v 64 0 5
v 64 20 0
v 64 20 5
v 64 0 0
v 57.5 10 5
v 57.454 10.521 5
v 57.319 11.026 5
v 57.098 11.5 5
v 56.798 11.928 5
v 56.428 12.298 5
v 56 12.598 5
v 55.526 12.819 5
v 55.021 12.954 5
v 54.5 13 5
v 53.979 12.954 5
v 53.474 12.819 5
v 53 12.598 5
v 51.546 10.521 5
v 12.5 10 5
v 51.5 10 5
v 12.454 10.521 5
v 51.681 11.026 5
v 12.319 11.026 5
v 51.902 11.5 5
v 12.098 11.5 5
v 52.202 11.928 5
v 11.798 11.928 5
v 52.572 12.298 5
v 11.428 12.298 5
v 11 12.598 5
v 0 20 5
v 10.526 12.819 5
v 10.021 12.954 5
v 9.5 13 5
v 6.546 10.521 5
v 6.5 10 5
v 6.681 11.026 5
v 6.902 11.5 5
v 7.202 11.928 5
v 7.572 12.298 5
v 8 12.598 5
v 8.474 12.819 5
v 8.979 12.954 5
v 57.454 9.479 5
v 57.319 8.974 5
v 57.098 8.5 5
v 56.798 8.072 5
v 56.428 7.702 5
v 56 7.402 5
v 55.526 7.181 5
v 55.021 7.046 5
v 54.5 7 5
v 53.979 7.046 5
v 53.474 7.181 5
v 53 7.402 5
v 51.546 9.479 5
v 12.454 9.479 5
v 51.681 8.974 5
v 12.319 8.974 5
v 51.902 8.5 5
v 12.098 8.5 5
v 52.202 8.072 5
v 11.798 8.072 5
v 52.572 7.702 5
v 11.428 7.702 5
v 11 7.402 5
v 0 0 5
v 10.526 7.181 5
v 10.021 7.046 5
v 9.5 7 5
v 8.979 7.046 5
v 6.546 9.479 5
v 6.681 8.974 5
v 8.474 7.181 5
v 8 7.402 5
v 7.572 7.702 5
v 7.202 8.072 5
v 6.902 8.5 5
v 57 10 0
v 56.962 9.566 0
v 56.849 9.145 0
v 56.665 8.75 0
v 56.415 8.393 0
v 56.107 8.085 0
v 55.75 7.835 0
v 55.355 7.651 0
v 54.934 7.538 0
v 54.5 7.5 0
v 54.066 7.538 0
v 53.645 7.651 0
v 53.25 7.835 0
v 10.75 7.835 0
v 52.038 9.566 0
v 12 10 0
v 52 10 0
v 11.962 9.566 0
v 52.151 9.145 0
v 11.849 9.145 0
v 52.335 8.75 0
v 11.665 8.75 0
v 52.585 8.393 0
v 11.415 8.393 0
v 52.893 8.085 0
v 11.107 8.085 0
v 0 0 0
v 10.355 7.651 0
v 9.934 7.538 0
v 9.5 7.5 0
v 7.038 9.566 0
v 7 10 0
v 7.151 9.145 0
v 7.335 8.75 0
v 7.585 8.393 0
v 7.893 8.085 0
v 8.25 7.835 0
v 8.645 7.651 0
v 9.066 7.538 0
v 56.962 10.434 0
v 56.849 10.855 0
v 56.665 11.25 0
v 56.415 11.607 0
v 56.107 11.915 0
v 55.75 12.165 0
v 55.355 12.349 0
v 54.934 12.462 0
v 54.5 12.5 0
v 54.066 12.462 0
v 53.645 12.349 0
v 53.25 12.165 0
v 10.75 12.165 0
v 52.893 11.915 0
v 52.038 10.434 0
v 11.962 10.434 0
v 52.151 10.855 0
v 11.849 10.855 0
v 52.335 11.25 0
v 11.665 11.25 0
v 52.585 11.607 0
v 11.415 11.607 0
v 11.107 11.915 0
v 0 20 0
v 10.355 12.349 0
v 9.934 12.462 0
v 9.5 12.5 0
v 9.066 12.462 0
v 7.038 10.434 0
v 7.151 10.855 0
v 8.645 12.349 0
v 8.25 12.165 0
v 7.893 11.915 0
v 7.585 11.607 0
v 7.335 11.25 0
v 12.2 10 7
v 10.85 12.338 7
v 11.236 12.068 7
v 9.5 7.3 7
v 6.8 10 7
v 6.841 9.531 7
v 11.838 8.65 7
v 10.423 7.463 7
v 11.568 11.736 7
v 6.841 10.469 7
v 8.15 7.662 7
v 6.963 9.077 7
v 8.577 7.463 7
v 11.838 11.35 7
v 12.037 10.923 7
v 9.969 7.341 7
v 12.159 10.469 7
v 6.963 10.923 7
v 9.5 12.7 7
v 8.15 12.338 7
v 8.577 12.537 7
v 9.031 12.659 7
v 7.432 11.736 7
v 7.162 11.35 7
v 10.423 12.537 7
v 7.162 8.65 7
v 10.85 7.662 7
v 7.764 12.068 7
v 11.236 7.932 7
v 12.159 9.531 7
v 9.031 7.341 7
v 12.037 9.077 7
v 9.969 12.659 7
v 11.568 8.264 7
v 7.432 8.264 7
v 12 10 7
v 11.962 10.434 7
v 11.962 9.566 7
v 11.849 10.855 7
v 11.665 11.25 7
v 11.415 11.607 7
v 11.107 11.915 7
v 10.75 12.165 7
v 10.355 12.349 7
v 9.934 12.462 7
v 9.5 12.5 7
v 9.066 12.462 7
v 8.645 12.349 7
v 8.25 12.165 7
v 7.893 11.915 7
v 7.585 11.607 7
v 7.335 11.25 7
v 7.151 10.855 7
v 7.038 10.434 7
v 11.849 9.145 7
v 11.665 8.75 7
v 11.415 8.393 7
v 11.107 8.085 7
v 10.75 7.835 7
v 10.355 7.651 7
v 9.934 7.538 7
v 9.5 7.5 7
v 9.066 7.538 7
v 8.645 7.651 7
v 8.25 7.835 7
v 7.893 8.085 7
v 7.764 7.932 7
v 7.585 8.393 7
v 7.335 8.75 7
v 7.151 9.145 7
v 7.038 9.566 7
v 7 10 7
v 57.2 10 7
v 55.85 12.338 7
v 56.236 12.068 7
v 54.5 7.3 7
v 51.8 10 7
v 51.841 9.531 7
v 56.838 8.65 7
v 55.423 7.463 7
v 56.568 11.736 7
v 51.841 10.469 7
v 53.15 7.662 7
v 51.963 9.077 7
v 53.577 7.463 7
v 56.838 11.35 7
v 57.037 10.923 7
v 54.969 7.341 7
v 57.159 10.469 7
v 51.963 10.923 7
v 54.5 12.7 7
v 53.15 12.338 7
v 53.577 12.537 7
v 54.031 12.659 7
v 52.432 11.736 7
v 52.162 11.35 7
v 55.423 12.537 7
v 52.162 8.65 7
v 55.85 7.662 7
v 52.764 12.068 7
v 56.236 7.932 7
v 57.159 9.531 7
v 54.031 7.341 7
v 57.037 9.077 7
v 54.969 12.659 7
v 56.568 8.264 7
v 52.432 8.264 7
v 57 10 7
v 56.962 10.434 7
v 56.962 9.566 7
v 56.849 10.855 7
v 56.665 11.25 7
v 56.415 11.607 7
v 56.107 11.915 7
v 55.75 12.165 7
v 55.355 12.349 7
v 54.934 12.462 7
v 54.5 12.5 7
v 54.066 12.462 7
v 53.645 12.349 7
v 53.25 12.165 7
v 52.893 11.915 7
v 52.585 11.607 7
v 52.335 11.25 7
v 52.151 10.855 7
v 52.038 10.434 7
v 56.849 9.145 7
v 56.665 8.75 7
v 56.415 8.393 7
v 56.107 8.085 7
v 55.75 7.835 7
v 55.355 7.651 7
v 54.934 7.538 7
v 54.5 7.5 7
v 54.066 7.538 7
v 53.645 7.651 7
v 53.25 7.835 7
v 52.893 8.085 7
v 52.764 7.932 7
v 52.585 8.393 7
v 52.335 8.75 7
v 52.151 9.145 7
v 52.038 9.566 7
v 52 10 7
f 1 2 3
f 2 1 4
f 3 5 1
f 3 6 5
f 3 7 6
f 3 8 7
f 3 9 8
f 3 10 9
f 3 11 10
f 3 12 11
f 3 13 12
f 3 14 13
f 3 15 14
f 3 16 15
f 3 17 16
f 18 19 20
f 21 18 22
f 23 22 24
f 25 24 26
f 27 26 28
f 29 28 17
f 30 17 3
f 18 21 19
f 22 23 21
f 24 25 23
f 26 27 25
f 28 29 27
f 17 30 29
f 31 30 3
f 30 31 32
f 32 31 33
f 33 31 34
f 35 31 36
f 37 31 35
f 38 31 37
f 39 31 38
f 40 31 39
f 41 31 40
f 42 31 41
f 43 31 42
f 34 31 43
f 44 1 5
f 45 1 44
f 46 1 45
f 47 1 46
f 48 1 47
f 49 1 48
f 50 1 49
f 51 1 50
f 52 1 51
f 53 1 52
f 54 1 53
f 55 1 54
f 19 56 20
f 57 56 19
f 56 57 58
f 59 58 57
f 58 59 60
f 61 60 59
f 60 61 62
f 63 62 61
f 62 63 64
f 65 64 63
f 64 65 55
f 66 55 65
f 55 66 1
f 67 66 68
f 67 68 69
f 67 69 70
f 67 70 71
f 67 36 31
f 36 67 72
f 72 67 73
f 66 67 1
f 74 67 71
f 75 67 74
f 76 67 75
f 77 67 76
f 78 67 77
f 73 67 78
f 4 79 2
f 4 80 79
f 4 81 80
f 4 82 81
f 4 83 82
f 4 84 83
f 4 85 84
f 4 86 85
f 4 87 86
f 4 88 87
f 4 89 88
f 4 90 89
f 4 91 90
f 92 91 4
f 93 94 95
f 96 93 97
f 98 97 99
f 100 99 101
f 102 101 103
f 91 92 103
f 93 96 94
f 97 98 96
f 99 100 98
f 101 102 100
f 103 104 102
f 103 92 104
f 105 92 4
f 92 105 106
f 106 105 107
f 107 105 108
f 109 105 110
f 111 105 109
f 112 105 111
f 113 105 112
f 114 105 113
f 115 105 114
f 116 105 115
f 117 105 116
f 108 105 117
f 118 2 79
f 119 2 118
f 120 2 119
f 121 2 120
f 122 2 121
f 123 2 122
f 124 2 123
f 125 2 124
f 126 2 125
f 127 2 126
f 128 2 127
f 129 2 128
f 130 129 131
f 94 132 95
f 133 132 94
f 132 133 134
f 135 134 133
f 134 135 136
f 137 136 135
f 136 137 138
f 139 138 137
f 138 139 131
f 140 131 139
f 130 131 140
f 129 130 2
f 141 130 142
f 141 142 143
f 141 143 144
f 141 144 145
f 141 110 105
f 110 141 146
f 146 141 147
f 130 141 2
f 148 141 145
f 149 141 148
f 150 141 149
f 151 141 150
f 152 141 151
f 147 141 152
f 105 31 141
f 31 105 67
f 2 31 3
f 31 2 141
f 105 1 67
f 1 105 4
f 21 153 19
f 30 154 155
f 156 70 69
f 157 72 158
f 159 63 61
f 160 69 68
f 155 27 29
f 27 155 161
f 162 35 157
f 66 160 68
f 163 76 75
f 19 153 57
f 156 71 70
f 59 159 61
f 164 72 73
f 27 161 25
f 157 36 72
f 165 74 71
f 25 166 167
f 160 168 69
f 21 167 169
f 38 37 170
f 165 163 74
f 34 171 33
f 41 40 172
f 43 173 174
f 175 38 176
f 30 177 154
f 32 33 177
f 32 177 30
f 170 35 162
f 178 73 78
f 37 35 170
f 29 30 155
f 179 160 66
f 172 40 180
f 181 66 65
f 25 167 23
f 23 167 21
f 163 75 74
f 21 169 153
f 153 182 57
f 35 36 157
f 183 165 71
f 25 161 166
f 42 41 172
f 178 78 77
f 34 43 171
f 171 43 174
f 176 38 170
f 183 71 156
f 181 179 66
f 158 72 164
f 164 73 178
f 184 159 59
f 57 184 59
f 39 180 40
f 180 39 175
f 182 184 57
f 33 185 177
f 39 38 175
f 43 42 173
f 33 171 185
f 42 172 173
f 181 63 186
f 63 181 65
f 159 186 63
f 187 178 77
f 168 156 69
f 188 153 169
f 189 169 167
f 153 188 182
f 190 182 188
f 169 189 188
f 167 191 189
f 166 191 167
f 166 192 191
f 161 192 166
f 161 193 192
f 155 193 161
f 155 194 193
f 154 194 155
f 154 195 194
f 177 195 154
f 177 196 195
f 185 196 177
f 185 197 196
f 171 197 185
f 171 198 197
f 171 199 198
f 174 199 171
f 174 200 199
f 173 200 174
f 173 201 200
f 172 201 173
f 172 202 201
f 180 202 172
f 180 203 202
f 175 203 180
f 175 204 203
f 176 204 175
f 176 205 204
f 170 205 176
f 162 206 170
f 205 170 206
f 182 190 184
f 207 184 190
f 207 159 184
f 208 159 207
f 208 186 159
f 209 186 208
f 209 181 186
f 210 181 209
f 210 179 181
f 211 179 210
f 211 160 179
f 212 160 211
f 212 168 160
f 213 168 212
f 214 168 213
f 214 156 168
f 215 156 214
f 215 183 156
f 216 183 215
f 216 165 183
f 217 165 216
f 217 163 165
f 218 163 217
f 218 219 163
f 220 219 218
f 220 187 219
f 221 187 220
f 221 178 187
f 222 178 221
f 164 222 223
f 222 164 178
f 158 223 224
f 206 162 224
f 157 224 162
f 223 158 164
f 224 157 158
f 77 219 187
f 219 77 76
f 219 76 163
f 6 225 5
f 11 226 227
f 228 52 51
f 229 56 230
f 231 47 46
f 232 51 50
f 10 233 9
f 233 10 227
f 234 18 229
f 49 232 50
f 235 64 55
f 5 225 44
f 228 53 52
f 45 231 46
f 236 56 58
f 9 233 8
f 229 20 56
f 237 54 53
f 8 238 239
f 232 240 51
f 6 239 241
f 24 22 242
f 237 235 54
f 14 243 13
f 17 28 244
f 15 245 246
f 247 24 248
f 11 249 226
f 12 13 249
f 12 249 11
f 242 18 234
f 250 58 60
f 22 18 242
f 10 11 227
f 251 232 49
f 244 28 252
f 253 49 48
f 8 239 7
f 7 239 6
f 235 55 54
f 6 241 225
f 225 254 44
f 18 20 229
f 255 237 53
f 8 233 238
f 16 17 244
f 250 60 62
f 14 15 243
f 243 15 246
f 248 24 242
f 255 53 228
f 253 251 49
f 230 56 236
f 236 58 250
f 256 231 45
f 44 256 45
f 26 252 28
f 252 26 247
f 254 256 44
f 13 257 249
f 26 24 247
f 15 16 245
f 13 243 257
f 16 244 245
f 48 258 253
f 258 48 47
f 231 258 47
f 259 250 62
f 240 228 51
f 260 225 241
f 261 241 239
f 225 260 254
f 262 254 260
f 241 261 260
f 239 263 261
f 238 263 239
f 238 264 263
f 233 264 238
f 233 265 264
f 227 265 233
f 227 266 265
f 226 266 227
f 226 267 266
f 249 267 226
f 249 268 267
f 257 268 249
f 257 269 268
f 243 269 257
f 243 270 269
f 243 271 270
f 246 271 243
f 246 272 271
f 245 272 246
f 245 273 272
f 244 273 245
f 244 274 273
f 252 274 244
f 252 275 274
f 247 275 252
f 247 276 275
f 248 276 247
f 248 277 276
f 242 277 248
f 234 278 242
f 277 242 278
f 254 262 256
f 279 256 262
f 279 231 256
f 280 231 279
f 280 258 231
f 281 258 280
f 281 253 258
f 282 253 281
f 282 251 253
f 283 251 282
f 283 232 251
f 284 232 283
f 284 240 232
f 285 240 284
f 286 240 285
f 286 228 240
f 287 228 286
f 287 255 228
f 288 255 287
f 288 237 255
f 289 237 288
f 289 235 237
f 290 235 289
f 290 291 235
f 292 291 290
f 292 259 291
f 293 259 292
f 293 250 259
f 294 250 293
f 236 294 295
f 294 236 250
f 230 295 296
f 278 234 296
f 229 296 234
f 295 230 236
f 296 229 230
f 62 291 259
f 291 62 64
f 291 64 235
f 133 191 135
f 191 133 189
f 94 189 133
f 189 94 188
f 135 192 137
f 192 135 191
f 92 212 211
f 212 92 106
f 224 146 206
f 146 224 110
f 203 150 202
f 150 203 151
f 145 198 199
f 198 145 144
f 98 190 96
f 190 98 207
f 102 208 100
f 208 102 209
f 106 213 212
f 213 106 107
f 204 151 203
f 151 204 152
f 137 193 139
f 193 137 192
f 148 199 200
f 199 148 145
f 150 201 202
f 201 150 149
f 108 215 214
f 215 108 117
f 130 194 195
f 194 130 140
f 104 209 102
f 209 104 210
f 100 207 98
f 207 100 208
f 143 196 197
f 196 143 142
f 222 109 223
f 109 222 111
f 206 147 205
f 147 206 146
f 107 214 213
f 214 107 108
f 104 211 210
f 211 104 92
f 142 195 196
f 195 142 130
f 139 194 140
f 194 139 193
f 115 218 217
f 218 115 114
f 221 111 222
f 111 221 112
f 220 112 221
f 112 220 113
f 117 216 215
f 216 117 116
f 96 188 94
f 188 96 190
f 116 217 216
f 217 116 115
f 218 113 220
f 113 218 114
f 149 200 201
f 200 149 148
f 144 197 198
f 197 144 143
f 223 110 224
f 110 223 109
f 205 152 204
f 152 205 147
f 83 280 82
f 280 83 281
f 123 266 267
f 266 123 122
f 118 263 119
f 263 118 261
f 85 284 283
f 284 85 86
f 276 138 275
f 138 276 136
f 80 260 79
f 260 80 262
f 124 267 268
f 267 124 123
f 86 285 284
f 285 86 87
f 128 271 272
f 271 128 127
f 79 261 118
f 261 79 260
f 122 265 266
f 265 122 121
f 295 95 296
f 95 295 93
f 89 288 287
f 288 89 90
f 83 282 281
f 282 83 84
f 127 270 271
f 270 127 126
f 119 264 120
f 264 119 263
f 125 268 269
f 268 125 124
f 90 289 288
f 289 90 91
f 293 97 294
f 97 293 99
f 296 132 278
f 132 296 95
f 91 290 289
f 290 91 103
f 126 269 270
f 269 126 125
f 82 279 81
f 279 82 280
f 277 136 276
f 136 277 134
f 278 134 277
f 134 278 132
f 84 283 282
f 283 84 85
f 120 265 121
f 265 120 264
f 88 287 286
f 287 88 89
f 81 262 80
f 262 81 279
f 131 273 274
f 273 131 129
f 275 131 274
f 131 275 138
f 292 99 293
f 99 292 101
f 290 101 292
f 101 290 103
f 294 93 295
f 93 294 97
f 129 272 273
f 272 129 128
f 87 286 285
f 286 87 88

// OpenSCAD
$fn=36;
//Durchmesser Beilagscheibe groß
dmbg=16;
a=64;
b=51;
c=39;
d=10;
e=5;
i=(a-b)/2;
//Durchmesser Loch Breite Solarpanel
k=(b-c)/2;
m=i+k/2;
h=d*2;
t=5;
//Dicke Verstaerkung
tv=2;

   
//    translate([(a-b)/2,0,0])
//    translate([e/2,h/2,0])
//    cylinder(h=t, d=e);
    
//    translate([-(a-b)/2,0,0])
//    translate([a-e/2,h/2,0])
//    cylinder(h=t, d=f);


module lochanlage()
{
    s=1;
    color("green")
    scale([s,s,s])
    {
        cylinder(h=tv, d1=k, d2=k*0.9);
    }
}

module verbindermitanlagenlochverstaerkung()
{
    cube([a,h,t]);
    
    translate([m,h/2,t])
    lochanlage();
    
    translate([a-m,h/2,t])
    lochanlage();
}

difference() {
    verbindermitanlagenlochverstaerkung();
    
    translate([m,h/2,0])
    cylinder(h=t+tv, d=e);
    
    translate([a-m,h/2,0])
    cylinder(h=t+tv, d=e);
}
